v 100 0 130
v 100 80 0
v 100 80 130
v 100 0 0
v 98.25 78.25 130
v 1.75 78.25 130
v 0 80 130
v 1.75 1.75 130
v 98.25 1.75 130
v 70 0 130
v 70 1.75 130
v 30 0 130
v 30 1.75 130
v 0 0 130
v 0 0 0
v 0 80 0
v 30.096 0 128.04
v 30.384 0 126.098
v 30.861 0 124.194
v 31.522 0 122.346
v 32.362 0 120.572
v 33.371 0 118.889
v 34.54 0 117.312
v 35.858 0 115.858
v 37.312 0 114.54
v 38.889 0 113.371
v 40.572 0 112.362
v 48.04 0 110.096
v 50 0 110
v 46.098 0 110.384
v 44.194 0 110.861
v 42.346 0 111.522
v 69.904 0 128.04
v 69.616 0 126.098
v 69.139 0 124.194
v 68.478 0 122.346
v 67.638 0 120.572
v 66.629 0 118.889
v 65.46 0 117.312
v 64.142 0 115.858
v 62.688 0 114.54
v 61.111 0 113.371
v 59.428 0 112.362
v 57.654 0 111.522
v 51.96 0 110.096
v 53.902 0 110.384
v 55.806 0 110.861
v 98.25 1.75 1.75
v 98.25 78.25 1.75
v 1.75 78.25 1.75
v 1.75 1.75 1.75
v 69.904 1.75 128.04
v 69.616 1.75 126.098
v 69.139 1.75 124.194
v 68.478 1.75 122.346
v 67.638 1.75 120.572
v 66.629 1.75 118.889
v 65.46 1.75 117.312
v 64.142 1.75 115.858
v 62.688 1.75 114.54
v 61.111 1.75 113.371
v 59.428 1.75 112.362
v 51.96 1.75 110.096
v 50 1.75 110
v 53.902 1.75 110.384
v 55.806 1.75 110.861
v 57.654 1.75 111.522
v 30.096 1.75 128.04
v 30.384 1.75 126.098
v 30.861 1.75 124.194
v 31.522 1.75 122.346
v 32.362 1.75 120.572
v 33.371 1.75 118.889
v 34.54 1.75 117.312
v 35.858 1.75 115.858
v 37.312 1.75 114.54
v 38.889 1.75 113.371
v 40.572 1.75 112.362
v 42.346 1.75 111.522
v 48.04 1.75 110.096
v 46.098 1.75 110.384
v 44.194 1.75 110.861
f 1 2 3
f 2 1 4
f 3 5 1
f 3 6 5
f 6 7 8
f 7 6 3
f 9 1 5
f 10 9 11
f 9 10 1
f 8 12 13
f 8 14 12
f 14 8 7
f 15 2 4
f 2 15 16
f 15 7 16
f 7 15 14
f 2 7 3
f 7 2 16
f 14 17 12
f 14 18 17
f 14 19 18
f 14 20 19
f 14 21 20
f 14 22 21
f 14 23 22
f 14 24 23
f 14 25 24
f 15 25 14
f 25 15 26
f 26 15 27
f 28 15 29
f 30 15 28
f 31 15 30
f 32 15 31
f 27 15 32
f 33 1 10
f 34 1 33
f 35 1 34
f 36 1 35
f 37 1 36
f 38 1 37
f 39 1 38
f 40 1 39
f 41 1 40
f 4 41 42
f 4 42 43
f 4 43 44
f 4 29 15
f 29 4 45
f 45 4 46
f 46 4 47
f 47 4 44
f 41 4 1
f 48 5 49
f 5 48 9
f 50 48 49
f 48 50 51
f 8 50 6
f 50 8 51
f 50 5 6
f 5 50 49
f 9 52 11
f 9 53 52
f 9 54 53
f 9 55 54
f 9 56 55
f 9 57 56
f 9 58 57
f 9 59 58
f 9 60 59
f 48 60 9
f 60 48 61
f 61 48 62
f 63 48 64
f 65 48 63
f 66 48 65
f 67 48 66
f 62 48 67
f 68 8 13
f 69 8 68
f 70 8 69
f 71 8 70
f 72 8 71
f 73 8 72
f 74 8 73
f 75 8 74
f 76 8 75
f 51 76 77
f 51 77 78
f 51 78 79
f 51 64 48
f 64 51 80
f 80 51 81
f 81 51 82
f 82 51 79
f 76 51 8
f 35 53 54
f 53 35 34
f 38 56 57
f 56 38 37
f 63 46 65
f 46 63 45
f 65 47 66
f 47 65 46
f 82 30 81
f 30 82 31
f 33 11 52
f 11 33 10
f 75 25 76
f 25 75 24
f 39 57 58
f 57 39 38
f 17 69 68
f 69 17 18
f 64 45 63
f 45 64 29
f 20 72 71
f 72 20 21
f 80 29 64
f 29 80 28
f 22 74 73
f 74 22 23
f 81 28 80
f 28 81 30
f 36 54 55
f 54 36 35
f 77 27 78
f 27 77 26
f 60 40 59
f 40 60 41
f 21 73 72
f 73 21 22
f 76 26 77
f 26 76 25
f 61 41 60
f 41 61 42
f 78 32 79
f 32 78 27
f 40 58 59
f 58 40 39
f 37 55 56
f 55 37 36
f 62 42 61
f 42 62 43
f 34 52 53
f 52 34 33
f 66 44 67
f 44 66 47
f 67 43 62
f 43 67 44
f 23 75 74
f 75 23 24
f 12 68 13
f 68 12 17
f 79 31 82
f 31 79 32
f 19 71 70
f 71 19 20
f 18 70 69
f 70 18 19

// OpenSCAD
width = 100;
depth = 80;
height = 130;
thick = 1.75;
handle_size = width/5;

$fn = 64;

union()
{
    difference()
    {
        cube([width,depth,height]);
        translate([thick,thick,thick])
            cube([width-(thick*2),depth-(thick*2),height]);
        translate([width/2,thick+1,height])
            rotate([90,90,0])
                cylinder(thick*2, r=handle_size);
    }
    
}
